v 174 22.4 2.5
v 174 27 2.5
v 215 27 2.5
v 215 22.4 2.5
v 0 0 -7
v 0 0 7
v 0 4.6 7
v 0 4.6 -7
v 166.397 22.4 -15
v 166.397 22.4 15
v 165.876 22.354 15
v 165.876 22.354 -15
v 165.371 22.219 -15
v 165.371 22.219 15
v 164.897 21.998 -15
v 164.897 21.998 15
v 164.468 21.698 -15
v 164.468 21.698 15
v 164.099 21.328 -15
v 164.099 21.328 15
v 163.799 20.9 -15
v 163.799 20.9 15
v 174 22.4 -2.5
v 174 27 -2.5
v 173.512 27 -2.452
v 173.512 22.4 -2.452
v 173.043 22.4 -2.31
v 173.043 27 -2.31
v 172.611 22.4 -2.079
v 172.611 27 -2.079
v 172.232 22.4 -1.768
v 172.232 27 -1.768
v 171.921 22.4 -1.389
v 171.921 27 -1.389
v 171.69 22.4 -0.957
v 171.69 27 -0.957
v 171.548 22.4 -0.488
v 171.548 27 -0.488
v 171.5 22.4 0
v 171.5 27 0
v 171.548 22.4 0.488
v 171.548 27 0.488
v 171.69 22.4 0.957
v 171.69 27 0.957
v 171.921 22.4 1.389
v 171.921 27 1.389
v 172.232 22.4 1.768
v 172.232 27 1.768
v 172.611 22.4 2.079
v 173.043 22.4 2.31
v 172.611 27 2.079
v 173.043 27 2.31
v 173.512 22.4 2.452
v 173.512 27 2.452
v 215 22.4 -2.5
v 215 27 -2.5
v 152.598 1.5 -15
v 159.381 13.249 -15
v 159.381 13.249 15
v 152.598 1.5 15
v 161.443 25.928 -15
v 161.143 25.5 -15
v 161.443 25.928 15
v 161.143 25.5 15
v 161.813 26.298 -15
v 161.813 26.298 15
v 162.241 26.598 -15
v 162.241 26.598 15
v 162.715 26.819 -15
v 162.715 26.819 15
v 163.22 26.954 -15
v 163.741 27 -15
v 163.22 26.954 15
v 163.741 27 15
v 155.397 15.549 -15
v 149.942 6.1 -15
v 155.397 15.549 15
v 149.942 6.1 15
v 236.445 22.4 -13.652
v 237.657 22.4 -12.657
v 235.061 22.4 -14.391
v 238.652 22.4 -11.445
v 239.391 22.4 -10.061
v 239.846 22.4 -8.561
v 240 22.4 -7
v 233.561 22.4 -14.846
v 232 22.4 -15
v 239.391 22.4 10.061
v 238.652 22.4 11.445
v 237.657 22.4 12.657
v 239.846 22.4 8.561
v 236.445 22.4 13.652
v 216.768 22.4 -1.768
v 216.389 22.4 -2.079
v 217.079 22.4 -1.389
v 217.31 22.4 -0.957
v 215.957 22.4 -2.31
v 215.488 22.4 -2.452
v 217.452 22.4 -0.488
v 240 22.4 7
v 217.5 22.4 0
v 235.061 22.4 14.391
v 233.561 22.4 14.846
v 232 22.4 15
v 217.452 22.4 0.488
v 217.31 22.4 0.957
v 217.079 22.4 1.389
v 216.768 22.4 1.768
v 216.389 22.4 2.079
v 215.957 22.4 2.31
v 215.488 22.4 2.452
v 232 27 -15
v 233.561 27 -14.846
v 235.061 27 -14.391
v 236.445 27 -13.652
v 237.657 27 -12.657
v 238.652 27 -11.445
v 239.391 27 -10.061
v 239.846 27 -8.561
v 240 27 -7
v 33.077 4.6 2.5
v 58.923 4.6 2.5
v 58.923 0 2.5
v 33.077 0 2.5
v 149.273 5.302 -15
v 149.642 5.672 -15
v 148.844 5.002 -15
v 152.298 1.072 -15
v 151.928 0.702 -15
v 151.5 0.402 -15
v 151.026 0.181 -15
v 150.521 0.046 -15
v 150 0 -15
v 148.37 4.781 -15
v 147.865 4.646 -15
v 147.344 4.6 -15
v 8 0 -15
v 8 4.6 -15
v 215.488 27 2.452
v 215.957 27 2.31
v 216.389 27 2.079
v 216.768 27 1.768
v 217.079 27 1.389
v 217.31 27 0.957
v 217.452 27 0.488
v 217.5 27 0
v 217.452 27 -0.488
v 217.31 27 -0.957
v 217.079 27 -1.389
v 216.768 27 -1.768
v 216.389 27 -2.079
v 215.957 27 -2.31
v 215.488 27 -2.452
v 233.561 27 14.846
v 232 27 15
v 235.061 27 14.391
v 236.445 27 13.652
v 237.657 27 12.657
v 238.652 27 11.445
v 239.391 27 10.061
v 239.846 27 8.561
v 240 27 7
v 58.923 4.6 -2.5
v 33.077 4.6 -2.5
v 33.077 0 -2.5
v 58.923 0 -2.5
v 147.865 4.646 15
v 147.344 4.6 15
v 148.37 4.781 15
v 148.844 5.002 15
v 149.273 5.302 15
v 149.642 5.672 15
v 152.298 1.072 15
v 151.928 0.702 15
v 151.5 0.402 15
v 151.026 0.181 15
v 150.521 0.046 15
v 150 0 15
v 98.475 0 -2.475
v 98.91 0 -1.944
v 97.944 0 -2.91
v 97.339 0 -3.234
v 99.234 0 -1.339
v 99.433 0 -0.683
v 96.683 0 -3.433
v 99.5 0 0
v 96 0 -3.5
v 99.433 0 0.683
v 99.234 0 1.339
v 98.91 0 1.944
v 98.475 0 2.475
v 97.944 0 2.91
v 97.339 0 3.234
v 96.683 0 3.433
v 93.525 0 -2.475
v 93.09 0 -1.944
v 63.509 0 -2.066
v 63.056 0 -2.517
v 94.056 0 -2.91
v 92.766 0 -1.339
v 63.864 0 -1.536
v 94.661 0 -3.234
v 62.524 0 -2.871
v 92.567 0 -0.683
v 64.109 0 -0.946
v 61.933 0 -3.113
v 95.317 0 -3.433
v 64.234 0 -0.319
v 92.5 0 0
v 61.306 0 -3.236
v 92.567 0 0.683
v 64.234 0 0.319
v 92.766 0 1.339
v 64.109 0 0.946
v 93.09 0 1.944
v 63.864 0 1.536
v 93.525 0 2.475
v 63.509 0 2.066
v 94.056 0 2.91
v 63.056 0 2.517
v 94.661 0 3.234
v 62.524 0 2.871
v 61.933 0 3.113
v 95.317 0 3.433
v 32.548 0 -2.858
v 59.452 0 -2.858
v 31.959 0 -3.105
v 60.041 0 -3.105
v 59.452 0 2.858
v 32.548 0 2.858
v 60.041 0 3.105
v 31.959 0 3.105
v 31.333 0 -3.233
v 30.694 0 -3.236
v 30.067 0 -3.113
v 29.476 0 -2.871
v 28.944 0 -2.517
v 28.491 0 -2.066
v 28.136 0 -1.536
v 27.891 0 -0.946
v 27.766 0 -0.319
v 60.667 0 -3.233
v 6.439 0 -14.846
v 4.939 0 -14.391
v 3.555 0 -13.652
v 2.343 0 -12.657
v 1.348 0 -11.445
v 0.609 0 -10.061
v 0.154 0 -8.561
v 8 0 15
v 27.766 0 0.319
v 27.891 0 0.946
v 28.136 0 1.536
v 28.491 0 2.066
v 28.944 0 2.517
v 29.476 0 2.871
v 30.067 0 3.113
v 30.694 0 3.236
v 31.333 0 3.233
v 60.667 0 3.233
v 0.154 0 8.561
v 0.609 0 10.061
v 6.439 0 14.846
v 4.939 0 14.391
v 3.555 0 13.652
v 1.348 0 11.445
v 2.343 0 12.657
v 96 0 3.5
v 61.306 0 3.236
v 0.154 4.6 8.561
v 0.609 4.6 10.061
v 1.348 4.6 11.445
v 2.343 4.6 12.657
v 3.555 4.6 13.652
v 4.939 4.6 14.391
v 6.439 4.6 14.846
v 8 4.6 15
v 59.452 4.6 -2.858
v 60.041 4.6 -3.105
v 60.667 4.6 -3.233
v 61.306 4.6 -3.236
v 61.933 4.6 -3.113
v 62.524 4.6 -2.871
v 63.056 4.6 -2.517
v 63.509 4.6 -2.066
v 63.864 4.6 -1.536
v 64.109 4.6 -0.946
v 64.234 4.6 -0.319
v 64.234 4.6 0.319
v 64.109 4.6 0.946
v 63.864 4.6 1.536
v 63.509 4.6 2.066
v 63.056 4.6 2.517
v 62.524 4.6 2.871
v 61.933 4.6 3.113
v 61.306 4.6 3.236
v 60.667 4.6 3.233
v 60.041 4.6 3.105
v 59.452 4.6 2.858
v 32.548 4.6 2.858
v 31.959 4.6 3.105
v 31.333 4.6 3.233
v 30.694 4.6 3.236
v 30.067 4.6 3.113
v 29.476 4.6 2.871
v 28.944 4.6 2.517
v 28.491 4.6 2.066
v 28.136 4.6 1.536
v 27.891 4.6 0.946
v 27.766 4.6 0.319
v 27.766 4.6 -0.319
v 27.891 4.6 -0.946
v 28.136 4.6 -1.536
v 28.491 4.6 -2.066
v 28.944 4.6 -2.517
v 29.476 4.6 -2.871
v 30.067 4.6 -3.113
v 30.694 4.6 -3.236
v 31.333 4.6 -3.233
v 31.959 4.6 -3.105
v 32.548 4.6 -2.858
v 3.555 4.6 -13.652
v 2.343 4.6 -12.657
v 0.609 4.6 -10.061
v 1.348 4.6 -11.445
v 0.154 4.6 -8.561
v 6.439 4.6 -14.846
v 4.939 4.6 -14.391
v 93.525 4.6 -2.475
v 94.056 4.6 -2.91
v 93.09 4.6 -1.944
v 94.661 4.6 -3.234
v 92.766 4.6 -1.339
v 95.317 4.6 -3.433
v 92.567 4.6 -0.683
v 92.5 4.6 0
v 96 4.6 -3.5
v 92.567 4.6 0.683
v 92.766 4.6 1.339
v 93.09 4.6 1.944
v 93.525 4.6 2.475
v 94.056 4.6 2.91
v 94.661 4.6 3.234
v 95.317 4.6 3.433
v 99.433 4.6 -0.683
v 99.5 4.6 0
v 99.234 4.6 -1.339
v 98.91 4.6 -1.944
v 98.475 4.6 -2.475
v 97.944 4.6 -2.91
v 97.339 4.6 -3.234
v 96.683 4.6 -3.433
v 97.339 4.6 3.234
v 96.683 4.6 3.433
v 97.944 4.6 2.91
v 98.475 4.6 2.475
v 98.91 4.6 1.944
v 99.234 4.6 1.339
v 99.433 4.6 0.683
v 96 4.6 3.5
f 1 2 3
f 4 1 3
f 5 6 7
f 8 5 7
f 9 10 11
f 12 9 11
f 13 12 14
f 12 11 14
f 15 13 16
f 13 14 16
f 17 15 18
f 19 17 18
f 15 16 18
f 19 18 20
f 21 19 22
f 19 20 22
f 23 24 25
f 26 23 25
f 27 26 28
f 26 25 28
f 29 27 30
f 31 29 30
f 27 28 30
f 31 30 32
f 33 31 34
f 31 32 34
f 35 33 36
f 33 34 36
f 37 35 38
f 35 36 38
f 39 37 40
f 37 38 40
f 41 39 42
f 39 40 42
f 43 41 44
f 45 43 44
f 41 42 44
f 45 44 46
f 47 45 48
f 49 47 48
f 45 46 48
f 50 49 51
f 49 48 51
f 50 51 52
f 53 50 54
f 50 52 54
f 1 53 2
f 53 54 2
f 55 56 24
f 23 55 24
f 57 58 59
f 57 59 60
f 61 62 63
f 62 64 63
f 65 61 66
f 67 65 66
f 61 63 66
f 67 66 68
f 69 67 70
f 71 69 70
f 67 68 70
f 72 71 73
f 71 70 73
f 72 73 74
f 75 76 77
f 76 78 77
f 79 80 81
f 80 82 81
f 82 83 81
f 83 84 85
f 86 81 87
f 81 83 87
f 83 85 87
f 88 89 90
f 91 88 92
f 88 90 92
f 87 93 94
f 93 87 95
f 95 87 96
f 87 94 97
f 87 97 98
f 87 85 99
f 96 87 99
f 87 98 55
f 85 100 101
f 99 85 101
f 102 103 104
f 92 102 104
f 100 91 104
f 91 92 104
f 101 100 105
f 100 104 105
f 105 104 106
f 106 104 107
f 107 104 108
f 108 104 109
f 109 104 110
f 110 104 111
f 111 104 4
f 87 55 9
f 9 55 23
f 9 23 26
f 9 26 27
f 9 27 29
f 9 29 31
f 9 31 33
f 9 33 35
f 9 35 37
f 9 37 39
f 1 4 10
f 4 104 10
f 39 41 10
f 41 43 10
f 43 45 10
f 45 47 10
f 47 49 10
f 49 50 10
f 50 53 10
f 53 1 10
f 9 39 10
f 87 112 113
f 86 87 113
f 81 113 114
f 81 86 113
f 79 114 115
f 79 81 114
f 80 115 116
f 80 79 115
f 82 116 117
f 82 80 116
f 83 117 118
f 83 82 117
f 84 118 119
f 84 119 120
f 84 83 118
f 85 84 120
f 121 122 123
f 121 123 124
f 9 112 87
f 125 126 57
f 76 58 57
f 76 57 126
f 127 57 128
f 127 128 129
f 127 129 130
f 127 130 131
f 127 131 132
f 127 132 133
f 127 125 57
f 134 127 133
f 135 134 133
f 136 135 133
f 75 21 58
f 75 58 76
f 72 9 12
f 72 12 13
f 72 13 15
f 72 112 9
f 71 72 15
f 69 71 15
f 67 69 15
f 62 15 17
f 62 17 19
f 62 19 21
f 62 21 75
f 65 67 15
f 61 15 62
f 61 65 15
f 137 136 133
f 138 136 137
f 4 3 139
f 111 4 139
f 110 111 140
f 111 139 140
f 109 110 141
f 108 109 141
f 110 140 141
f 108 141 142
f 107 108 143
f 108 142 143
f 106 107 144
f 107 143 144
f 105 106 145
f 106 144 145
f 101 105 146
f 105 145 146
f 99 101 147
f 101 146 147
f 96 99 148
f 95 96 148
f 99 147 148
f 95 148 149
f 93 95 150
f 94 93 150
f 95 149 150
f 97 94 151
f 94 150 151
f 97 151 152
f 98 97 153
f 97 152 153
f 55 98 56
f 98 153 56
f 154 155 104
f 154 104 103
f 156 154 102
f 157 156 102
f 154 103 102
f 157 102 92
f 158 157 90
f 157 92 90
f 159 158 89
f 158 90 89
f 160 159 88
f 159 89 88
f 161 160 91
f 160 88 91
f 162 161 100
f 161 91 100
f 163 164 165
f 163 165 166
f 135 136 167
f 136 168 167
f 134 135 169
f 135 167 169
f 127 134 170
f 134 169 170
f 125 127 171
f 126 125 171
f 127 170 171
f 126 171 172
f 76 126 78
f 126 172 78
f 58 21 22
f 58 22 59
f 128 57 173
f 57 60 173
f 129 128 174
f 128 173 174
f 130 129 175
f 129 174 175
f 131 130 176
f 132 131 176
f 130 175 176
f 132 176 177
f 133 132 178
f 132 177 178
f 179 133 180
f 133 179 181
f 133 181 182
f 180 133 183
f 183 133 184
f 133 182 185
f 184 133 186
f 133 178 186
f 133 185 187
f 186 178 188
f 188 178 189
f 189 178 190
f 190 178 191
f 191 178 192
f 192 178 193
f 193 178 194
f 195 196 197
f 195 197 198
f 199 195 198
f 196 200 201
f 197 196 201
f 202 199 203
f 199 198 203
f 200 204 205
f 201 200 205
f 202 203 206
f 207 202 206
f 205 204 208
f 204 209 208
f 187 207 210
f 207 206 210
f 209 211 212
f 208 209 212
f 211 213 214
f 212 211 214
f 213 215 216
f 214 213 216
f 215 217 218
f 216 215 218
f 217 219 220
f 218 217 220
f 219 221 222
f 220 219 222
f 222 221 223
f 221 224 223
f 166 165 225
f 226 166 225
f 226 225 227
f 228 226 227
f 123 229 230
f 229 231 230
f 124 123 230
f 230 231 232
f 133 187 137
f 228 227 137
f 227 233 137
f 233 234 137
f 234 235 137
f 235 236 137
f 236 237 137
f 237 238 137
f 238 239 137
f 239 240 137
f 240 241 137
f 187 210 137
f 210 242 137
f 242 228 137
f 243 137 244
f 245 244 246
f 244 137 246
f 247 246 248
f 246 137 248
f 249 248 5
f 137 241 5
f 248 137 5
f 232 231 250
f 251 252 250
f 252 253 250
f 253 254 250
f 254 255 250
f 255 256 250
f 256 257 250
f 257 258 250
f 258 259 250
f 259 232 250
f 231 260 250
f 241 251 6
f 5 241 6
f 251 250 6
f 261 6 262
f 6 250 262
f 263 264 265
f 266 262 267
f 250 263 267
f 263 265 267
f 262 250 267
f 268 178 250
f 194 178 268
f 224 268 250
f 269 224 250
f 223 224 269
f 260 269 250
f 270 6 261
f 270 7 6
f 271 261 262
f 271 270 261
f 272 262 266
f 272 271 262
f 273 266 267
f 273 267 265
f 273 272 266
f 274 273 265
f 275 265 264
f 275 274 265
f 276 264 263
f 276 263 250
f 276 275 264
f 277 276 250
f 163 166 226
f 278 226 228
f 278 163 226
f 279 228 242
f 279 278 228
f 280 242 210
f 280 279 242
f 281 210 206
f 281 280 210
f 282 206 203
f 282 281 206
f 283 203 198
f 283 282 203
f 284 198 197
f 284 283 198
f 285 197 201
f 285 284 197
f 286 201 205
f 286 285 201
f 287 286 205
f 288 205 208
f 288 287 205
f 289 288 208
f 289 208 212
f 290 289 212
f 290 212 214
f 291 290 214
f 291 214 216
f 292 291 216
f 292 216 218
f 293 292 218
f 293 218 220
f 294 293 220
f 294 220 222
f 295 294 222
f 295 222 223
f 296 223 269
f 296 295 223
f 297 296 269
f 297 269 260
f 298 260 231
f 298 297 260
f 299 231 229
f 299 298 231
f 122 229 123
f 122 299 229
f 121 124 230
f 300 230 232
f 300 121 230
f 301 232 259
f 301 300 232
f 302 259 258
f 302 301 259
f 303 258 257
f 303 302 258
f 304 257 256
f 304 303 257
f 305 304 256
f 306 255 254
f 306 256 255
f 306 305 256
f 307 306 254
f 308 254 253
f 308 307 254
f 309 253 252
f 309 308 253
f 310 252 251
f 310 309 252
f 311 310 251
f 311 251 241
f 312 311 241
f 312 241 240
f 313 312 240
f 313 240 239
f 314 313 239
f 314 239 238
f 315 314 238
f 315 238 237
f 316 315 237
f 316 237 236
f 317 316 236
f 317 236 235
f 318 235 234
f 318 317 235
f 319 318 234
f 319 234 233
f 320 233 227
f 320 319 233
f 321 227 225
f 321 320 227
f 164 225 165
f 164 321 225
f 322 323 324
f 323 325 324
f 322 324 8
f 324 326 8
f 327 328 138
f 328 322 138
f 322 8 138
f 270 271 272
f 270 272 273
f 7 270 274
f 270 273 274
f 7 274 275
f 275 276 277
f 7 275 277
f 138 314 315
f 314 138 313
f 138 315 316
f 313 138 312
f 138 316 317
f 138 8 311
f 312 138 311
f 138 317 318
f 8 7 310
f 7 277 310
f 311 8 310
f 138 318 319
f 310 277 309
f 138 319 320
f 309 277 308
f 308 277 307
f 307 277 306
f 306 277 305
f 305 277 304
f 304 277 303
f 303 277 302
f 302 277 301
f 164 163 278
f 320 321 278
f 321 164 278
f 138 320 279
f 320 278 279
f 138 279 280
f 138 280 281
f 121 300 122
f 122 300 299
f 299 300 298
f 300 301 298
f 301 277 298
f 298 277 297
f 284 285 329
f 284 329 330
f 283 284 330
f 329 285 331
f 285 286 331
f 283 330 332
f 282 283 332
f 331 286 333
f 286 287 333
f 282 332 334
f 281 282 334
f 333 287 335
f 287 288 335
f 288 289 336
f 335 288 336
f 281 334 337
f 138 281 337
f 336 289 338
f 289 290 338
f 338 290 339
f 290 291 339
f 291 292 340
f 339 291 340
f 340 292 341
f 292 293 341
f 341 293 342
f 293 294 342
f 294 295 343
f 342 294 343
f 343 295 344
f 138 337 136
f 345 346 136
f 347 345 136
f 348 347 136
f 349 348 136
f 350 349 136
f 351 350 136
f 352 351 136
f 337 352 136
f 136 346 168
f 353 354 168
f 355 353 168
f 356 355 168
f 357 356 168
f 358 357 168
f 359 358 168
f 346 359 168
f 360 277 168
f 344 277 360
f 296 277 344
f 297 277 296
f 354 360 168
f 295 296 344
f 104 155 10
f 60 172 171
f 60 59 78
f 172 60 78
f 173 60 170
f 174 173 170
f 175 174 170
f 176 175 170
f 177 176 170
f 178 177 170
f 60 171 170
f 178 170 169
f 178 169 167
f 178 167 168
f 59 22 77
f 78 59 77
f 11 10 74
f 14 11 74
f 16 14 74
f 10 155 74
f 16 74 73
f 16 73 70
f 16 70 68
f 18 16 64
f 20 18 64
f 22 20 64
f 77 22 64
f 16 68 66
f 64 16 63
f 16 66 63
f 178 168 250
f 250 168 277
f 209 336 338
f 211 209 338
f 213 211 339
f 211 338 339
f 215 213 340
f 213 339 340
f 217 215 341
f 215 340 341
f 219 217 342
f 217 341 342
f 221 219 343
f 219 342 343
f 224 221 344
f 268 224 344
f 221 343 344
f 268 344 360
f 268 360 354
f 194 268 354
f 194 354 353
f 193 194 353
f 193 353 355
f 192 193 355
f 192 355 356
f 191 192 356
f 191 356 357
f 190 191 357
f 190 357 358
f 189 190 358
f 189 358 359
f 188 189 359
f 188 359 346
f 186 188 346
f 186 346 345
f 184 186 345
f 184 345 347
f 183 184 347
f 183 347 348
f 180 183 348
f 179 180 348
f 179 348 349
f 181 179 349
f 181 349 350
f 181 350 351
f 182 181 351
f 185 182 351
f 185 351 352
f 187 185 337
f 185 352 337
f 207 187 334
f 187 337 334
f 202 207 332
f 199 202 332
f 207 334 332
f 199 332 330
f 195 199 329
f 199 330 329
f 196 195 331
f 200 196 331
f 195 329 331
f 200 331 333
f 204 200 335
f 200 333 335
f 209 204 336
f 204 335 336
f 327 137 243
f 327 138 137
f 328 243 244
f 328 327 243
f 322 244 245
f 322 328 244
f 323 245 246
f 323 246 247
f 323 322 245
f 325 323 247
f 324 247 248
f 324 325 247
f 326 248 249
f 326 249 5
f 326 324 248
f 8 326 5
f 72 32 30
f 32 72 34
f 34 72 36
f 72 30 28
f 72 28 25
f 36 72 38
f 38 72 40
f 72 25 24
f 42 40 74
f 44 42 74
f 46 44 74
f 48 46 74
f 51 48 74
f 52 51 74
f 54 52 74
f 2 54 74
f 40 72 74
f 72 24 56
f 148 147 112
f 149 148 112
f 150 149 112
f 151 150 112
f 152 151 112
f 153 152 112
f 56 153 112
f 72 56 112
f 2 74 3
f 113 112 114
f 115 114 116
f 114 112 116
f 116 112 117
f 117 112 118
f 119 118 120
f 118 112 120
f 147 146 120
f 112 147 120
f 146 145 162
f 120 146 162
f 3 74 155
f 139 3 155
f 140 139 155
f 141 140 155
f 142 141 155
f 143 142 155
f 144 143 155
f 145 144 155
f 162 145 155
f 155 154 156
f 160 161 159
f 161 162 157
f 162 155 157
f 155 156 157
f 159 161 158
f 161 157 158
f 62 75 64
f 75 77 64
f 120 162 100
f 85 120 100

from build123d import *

# Parameters (mm, degrees)
EXTRUDE_1_DEPTH     = 15
CUT_EXTRUDE_1_DEPTH = 242.509337294
FILLET_1_R          = 8
SKETCH_4_R          = 3.5
CUT_EXTRUDE_2_DEPTH = 242.509337294
CUT_EXTRUDE_3_DEPTH = 242.979337961
FILLET_2_R          = 8


with BuildPart() as part:
    # 草圖2 → 填料-伸長1 (new, symmetric)
    with BuildSketch(Plane.XY):
        with BuildLine():
            Line((159.381107666, 13.248555109), (152.598076211, 1.5))
            ThreePointArc((152.598076211, 1.5), (151.5, 0.401923789), (150, 0))
            Line((150, 0), (0, 0))
            Line((0, 0), (0, 4.6))
            Line((0, 4.6), (147.344188762, 4.6))
            ThreePointArc((147.344188762, 4.6), (148.844188762, 5.001923789), (149.942264973, 6.1))
            Line((149.942264973, 6.1), (155.397390809, 15.548555109))
            Line((155.397390809, 15.548555109), (161.142860195, 25.5))
            ThreePointArc((161.142860195, 25.5), (162.240936407, 26.598076211), (163.740936407, 27))
            Line((163.740936407, 27), (240, 27))
            Line((240, 27), (240, 22.4))
            Line((240, 22.4), (166.396747645, 22.4))
            ThreePointArc((166.396747645, 22.4), (164.896747645, 21.998076211), (163.798671434, 20.9))
            Line((163.798671434, 20.9), (159.381107666, 13.248555109))
        make_face()
    extrude(amount=EXTRUDE_1_DEPTH, both=True)

    # 草圖3 → 除料-伸長1 (cut, through all)
    with BuildSketch(Plane(origin=(0, 4.6, 0), x_dir=(1, 0, 0), z_dir=(0, 1, 0))):
        with BuildLine():
            Line((33.076655966, 2.5), (58.923344034, 2.5))
            ThreePointArc((58.923344034, 2.5), (64.25, 0), (58.923344034, -2.5))
            Line((58.923344034, -2.5), (33.076655966, -2.5))
            ThreePointArc((33.076655966, -2.5), (27.75, 0), (33.076655966, 2.5))
        make_face()
    extrude(amount=-CUT_EXTRUDE_1_DEPTH, mode=Mode.SUBTRACT)

    # 圓角1
    fillet_1_edges = [part.edges().sort_by_distance(p)[0] for p in [
        (240, 24.7, -15),
        (240, 24.7, 15),
    ]]
    fillet(fillet_1_edges, radius=FILLET_1_R)

    # 草圖4 → 除料-伸長2 (cut, through all)
    with BuildSketch(Plane(origin=(0, 4.6, 0), x_dir=(1, 0, 0), z_dir=(0, 1, 0))):
        with Locations(Location((96, 0, 0), (0, 0, 180))):
            Circle(SKETCH_4_R)
    extrude(amount=-CUT_EXTRUDE_2_DEPTH, mode=Mode.SUBTRACT)

    # 草圖5 → 除料-伸長3 (cut, through all)
    with BuildSketch(Plane(origin=(0, 27, 0), x_dir=(1, 0, 0), z_dir=(0, 1, 0))):
        with BuildLine():
            Line((174, -2.5), (215, -2.5))
            ThreePointArc((215, -2.5), (217.5, 0), (215, 2.5))
            Line((215, 2.5), (174, 2.5))
            ThreePointArc((174, 2.5), (171.5, 0), (174, -2.5))
        make_face()
    extrude(amount=-CUT_EXTRUDE_3_DEPTH, mode=Mode.SUBTRACT)

    # 圓角2
    fillet_2_edges = [part.edges().sort_by_distance(p)[0] for p in [
        (0, 2.3, -15),
        (0, 2.3, 15),
    ]]
    fillet(fillet_2_edges, radius=FILLET_2_R)


solid = part.part
